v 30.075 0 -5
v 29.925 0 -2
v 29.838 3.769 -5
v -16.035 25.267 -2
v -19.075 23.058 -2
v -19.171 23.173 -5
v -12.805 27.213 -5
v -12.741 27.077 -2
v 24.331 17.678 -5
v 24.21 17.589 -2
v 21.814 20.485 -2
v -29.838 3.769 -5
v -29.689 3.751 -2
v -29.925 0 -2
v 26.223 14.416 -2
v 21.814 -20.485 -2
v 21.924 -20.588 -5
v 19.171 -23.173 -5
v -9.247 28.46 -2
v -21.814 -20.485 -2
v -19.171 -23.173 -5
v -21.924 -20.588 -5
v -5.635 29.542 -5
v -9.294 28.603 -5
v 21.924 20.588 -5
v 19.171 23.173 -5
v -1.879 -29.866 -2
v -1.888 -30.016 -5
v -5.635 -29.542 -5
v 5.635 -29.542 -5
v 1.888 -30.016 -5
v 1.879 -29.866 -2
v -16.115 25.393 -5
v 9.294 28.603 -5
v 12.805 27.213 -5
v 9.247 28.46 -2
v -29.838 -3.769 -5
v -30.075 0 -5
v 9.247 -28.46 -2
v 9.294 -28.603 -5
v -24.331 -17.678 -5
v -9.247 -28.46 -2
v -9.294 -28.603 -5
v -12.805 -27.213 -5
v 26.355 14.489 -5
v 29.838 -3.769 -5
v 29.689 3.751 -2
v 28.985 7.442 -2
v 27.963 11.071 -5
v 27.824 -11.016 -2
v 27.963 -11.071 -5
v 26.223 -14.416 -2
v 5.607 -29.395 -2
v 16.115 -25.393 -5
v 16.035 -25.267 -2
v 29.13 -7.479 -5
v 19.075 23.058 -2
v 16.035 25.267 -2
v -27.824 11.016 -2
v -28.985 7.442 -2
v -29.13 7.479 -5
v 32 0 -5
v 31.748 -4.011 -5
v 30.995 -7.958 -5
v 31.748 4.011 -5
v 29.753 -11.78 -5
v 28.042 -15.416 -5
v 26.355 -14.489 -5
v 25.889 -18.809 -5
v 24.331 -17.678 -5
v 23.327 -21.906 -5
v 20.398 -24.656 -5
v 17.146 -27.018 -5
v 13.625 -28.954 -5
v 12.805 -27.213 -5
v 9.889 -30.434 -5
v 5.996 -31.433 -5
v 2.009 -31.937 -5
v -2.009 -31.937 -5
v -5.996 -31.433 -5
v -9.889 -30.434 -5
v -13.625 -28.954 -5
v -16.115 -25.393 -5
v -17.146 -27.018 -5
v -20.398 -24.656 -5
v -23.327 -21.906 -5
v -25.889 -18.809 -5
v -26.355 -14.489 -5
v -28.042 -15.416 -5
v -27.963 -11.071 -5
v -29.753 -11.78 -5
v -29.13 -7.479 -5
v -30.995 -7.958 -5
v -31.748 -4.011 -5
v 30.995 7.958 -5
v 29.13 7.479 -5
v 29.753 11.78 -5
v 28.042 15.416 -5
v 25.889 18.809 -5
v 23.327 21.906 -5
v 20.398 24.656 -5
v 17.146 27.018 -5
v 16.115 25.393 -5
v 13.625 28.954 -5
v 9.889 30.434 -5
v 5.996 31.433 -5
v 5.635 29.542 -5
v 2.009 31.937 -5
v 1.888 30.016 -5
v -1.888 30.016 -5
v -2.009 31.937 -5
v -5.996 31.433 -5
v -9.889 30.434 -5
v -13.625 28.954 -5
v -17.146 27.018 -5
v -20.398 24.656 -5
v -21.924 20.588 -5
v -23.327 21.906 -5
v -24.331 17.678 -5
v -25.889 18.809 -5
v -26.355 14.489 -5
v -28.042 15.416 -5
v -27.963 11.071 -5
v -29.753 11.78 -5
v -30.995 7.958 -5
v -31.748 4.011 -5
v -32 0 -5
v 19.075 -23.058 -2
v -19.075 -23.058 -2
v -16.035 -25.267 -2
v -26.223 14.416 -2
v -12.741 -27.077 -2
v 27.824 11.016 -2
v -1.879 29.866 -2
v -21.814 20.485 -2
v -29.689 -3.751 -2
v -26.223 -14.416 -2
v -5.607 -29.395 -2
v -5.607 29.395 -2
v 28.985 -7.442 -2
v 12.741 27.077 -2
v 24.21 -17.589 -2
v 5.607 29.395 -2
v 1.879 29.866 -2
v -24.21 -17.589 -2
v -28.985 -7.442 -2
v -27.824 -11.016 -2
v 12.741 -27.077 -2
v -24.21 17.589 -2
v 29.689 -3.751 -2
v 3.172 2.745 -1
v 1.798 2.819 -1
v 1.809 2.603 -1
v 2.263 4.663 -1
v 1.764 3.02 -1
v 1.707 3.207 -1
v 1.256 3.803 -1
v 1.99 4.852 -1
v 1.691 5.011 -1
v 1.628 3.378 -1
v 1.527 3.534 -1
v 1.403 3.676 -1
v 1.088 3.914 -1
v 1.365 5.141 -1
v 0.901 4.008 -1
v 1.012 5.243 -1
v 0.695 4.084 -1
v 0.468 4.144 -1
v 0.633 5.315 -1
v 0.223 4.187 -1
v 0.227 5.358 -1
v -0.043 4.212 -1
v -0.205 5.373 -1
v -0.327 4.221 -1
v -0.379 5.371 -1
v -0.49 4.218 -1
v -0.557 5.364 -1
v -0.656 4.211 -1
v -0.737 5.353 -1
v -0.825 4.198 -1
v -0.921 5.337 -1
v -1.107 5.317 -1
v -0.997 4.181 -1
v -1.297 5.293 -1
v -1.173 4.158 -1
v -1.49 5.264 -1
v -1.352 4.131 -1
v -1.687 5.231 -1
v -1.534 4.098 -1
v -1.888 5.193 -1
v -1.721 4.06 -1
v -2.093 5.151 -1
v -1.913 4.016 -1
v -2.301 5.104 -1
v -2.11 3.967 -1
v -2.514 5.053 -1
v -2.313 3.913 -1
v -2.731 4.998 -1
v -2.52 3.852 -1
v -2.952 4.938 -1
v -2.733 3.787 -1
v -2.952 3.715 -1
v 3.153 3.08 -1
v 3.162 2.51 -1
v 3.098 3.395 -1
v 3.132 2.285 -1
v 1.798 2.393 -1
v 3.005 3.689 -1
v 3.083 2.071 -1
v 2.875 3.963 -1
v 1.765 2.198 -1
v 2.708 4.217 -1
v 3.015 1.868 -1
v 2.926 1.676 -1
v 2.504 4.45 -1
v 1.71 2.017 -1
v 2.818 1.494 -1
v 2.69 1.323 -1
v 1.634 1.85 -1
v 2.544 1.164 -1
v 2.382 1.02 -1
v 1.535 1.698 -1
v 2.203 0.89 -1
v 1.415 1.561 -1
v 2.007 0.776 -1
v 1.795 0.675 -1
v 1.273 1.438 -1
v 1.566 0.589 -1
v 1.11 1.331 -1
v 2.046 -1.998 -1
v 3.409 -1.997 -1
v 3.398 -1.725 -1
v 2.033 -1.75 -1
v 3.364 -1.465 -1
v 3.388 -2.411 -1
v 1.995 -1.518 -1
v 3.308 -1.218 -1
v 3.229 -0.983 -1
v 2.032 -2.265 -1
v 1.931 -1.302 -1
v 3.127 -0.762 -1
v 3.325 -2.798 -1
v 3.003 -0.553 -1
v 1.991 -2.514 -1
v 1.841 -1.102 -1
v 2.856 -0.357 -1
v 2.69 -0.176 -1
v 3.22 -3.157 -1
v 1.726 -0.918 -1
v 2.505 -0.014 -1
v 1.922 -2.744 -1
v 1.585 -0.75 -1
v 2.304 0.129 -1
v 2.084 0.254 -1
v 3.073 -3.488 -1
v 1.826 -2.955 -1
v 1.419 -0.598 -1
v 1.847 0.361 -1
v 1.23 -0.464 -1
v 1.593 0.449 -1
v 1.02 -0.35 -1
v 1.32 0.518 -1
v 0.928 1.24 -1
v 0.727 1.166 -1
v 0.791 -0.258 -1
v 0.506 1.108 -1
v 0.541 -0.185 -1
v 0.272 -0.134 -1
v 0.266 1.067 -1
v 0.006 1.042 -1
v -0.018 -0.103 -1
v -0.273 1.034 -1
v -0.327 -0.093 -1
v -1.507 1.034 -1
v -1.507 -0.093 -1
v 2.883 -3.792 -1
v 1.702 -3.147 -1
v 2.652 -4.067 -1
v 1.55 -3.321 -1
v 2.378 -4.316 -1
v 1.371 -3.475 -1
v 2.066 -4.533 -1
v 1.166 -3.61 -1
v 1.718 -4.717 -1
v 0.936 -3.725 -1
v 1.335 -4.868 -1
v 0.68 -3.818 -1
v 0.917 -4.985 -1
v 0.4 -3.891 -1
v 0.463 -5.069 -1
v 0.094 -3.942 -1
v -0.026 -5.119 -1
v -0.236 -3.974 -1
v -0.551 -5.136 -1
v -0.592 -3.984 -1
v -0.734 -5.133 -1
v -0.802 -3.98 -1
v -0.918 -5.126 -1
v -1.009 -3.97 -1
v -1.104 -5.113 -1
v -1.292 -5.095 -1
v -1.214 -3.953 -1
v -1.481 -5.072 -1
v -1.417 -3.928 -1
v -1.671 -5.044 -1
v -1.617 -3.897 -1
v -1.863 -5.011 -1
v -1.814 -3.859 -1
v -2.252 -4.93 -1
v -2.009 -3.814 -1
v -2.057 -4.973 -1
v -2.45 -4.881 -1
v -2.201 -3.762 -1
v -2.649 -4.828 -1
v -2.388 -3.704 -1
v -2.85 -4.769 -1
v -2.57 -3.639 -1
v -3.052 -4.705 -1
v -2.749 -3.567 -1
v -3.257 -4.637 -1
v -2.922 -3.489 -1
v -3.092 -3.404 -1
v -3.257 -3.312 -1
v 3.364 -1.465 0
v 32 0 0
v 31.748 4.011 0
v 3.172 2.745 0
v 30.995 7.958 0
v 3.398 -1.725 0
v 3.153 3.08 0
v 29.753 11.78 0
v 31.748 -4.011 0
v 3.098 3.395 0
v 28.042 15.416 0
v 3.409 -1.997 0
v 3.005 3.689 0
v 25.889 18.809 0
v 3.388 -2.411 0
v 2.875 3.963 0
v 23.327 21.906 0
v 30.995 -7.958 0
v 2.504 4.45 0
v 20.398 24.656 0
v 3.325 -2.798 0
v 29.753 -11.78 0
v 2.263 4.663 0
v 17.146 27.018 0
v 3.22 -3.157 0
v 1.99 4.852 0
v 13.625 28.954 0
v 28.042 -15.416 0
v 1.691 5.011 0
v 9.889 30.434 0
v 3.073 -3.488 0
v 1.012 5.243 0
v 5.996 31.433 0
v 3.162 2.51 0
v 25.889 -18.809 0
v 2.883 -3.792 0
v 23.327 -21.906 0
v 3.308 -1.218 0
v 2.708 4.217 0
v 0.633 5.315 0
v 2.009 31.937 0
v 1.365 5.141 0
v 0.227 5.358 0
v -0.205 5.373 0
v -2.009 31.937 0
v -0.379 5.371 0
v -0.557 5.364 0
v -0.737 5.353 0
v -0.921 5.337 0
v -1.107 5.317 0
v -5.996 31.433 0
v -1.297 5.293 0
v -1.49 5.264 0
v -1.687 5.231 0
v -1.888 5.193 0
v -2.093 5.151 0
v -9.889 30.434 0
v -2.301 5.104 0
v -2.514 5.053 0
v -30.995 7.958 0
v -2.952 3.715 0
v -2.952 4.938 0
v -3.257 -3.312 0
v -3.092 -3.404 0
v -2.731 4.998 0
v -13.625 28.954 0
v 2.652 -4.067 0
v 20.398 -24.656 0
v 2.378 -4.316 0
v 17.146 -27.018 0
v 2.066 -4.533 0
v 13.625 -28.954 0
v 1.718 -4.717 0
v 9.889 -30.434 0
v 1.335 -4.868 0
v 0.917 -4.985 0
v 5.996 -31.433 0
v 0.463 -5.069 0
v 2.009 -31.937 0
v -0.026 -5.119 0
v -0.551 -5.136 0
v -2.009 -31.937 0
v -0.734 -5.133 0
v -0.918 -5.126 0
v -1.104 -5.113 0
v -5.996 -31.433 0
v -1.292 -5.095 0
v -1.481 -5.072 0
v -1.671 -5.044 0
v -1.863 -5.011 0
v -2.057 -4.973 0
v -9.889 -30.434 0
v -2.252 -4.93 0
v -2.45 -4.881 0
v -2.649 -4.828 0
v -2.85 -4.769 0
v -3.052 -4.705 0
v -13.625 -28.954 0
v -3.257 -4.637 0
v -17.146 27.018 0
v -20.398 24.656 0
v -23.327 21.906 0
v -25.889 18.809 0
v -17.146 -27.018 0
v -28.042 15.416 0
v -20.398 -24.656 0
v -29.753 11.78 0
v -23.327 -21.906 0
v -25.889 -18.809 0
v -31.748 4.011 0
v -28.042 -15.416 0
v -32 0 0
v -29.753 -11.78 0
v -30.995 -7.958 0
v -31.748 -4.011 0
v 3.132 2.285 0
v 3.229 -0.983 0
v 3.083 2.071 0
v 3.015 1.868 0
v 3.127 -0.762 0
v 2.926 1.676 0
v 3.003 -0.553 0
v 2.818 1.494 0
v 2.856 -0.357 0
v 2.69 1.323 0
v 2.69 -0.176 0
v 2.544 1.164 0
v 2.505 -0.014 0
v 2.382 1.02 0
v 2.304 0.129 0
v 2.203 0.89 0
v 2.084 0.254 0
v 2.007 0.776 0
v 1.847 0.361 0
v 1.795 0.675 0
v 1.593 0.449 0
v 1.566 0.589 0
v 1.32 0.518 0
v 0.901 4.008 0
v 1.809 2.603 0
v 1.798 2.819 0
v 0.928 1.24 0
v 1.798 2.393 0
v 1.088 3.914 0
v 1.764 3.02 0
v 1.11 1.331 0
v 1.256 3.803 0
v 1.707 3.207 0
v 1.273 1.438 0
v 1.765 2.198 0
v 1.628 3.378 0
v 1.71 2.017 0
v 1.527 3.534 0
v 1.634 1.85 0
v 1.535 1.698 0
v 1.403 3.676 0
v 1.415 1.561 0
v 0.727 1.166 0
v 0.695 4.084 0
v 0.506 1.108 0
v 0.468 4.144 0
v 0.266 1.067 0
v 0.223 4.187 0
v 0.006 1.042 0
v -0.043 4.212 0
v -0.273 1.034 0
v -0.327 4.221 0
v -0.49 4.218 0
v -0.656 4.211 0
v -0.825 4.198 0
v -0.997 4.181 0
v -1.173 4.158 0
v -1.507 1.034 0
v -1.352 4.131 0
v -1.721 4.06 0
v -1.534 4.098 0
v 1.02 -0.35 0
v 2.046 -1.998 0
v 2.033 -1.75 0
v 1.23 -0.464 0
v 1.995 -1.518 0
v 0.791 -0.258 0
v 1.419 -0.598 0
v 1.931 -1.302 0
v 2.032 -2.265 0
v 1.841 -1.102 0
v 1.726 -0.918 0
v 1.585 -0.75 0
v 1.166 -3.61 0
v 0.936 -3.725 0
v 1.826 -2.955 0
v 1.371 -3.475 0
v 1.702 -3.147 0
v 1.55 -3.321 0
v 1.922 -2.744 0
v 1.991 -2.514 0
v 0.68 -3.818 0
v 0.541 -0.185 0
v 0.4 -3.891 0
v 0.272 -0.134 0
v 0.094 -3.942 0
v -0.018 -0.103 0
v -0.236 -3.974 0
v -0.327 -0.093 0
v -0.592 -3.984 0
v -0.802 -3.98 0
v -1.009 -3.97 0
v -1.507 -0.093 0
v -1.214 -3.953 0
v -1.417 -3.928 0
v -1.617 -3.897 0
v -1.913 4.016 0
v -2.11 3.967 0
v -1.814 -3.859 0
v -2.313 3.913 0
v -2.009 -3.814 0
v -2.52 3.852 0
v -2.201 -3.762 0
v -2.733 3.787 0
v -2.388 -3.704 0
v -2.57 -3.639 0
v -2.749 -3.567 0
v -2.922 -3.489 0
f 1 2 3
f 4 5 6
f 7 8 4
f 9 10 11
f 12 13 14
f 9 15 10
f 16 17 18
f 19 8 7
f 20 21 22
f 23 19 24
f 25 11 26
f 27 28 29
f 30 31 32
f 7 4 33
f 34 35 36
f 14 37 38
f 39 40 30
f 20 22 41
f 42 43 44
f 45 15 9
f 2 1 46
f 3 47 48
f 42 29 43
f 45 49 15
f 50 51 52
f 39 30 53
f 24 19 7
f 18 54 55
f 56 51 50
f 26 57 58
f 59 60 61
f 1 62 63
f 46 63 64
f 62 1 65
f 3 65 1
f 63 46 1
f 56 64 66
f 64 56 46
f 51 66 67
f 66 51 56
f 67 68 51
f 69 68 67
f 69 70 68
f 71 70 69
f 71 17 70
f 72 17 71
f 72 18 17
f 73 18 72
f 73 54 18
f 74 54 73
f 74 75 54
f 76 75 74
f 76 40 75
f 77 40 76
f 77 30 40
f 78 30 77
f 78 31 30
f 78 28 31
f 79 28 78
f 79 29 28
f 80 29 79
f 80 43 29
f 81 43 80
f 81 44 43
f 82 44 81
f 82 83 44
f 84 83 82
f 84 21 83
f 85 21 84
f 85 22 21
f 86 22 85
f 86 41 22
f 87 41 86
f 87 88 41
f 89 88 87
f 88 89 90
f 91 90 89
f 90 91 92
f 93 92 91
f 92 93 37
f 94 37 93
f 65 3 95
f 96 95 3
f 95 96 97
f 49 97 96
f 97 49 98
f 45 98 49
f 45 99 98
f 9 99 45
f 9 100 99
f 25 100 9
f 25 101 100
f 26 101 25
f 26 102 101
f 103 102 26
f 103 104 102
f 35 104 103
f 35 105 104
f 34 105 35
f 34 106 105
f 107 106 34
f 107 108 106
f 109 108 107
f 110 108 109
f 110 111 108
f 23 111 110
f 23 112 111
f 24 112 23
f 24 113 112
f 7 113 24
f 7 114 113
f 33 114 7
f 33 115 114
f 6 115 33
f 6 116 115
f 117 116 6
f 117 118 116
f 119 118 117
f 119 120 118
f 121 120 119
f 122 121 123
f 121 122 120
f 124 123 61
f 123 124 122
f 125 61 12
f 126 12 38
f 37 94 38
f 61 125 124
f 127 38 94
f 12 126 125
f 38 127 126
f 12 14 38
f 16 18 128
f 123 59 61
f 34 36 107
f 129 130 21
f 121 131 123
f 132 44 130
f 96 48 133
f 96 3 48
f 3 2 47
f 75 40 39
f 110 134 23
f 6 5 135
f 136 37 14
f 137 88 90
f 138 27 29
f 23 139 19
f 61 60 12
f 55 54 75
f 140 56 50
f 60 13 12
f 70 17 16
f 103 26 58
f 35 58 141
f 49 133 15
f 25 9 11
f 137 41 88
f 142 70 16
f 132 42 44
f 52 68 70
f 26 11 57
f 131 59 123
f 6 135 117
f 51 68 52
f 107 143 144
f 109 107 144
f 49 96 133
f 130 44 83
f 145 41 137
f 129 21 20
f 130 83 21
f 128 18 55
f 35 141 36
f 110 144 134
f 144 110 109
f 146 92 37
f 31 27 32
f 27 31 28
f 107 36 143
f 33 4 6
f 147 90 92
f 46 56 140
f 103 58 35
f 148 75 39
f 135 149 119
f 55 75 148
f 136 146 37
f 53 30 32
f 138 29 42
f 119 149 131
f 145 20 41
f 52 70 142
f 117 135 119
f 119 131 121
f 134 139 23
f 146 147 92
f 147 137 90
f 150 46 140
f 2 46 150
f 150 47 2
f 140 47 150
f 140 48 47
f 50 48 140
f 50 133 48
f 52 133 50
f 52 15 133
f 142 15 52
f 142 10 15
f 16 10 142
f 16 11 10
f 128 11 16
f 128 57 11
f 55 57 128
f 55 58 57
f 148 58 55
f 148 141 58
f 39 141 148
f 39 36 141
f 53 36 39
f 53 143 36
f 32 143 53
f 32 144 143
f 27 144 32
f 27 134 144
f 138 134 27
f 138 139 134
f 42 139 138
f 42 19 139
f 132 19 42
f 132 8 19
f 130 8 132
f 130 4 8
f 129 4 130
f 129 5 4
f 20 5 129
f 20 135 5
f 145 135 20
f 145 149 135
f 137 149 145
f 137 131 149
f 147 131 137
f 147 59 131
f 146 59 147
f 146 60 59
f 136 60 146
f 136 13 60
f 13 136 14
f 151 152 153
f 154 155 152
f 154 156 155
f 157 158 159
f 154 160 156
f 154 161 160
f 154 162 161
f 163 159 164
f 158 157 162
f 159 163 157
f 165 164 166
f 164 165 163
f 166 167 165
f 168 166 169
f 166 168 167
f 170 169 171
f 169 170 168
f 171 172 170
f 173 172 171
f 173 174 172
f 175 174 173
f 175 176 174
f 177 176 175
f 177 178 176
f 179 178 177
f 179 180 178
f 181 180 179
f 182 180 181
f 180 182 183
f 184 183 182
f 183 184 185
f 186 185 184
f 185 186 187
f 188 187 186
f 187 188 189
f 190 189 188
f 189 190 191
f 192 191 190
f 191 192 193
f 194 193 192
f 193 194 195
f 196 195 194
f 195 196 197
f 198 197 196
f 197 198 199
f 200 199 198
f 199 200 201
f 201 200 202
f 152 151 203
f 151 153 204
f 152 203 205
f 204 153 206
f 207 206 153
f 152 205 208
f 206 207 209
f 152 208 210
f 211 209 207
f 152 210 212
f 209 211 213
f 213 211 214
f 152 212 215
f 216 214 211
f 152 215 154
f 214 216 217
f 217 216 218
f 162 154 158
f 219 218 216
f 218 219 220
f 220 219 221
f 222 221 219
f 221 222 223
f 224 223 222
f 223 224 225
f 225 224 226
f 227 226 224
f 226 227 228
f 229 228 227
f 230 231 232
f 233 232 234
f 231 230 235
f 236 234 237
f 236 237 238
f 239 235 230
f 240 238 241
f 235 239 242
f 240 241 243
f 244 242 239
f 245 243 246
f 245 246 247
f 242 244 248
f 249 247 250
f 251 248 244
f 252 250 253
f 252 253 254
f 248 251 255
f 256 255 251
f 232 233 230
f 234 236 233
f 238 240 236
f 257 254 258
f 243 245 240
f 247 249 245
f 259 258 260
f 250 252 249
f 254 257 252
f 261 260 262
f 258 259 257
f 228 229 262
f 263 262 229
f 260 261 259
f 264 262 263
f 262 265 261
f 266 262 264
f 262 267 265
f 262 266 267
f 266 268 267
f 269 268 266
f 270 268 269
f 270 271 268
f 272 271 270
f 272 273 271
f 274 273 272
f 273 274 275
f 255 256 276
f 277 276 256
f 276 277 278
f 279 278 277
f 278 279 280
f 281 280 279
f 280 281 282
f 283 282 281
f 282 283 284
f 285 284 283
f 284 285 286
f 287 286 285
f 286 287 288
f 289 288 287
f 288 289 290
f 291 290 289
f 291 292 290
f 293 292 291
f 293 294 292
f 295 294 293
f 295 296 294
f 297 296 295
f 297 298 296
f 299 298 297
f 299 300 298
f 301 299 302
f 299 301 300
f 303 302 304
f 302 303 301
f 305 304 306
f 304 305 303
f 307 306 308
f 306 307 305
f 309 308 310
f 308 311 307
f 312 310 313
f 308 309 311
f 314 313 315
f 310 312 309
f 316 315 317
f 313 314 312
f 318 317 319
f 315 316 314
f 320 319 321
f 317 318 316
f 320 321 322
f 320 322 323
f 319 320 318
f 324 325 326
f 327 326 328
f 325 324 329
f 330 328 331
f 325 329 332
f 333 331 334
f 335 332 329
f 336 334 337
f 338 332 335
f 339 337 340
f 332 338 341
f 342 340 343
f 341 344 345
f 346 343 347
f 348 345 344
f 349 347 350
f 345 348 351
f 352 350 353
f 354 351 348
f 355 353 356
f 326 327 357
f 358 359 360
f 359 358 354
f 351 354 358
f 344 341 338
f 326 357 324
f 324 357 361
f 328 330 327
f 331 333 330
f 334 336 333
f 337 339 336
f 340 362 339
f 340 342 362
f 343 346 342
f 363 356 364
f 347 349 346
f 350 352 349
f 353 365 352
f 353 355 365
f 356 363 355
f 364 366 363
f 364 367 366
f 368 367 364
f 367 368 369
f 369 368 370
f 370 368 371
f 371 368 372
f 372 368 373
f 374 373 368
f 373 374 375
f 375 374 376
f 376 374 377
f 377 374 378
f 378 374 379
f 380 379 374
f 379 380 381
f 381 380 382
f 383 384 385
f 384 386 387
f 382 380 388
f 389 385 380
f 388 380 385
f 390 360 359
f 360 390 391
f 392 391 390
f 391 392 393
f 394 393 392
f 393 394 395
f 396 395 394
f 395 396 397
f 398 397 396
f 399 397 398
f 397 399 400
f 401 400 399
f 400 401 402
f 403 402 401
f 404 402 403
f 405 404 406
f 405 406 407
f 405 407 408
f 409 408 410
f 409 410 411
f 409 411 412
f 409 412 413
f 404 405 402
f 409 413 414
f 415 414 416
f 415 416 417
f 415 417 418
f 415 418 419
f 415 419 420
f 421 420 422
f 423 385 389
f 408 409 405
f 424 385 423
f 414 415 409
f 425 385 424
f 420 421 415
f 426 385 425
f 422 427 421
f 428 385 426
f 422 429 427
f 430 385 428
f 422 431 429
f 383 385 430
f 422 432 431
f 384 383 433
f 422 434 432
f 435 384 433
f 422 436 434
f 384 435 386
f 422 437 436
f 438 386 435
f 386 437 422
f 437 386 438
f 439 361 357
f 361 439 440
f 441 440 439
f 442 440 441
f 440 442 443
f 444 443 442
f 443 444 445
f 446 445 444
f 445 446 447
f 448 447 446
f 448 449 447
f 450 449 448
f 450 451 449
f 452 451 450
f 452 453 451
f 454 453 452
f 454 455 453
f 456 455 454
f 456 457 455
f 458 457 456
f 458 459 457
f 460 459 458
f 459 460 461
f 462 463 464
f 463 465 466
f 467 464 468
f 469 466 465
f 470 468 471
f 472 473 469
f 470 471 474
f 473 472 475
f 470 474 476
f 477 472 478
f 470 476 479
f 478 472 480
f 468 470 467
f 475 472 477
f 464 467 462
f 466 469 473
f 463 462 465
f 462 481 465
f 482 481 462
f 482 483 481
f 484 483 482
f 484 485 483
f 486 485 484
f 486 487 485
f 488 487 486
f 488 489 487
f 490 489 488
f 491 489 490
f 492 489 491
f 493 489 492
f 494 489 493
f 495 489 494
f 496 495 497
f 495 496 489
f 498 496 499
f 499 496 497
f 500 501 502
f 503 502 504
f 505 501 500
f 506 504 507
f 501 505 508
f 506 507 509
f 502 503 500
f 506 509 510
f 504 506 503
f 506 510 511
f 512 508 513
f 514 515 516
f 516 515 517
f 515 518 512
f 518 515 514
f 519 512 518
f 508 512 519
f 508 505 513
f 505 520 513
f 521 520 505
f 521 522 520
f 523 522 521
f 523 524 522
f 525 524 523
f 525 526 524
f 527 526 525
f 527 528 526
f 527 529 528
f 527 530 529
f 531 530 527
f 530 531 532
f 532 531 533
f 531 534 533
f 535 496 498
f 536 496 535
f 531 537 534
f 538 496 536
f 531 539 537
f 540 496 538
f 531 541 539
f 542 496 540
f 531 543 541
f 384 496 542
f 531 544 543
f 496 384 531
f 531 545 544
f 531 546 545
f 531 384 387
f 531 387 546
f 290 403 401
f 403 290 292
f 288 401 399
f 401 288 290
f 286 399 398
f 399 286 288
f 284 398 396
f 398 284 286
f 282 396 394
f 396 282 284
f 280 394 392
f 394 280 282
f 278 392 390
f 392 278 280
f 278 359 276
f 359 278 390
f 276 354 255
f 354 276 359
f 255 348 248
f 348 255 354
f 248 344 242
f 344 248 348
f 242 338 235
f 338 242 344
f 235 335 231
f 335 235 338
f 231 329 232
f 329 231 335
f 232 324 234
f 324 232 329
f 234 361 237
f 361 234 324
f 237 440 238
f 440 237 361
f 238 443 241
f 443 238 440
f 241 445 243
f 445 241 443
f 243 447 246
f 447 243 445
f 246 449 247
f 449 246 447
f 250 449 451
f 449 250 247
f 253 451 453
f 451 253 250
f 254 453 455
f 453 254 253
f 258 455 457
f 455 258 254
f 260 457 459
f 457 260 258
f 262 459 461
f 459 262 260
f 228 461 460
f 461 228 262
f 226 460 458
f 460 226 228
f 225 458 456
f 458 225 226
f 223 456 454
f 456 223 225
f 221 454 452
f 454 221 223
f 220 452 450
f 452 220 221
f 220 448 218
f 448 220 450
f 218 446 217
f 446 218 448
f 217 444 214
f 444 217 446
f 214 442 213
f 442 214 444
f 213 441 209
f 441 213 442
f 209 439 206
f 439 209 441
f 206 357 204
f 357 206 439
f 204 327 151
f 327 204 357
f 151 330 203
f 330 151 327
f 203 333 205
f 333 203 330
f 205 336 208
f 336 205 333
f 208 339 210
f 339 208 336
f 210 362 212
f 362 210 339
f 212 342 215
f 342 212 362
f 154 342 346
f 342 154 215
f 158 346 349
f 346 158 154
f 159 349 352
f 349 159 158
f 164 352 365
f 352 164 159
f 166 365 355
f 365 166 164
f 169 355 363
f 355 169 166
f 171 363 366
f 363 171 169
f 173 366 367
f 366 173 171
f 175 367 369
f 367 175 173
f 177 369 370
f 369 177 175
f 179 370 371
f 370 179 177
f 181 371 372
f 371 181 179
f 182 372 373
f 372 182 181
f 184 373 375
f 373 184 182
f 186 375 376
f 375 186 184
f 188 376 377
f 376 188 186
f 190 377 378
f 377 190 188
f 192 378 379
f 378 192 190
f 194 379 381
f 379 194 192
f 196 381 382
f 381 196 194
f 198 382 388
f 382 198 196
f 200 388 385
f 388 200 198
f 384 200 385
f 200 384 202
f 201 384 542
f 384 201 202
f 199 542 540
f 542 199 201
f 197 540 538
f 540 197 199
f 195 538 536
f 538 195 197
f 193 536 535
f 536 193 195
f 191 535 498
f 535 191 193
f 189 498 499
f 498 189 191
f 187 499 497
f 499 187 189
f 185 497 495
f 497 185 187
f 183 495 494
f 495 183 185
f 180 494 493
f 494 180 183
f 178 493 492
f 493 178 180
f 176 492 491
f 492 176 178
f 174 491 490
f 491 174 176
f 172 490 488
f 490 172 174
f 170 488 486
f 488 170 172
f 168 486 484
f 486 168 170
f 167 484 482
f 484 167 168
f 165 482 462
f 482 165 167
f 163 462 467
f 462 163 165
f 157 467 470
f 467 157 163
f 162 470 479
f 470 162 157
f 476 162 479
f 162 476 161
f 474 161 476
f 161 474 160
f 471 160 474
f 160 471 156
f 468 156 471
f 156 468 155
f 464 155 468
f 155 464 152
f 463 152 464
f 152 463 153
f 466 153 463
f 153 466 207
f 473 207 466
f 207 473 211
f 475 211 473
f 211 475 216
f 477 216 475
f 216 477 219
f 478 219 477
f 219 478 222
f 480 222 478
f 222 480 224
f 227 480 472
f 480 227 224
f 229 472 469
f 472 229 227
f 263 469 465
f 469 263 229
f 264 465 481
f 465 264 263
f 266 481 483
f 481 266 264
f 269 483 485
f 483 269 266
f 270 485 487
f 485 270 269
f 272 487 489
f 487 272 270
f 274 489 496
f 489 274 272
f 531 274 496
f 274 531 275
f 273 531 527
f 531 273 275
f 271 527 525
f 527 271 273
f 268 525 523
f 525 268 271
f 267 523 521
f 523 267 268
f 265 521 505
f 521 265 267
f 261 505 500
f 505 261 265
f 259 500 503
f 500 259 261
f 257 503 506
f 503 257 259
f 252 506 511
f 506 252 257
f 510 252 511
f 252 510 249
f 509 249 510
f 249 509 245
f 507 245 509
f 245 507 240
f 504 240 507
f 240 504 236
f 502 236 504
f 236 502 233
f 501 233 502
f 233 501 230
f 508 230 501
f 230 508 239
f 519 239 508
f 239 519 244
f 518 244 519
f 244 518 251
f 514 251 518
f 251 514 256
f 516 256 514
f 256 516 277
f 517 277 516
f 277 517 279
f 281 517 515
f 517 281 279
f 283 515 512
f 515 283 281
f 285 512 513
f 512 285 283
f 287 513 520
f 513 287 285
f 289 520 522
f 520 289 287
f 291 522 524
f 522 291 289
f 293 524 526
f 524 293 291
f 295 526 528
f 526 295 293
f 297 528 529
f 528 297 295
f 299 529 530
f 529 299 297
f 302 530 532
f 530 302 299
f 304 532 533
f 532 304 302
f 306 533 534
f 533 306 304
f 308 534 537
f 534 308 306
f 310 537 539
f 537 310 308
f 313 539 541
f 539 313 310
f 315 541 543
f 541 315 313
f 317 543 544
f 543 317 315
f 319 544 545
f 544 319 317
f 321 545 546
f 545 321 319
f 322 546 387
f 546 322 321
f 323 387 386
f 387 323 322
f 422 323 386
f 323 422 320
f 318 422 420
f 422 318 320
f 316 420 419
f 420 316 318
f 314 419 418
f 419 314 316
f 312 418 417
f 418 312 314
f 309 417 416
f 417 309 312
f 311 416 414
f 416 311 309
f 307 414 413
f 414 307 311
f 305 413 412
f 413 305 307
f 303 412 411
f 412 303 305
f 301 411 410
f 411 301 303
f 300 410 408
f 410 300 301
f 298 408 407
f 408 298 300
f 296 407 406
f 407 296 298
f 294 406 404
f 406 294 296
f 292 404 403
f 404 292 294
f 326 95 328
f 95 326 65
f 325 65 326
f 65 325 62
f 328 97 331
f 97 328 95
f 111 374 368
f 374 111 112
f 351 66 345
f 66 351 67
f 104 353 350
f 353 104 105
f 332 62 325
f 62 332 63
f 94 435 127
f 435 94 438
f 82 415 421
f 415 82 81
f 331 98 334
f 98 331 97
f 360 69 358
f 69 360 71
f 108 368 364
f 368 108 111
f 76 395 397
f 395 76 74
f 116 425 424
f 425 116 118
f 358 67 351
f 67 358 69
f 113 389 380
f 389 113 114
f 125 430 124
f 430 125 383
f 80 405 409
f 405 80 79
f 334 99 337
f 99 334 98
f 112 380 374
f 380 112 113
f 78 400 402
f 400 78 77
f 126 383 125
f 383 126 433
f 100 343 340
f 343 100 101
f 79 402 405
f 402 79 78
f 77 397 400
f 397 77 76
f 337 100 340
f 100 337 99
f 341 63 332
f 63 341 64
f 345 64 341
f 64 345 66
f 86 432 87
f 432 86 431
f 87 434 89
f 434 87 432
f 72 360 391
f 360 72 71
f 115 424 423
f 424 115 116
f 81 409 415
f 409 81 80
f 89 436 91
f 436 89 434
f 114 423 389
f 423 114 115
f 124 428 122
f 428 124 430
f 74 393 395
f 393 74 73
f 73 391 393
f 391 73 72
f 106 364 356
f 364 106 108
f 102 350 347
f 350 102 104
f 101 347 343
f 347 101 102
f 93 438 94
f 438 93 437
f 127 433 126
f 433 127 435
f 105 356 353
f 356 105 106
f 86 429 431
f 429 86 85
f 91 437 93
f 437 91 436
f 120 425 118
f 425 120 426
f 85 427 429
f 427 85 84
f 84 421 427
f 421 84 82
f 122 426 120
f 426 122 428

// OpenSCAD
$fn = 50;

difference() {
	union() {
		translate(v = [0, 0, -5.0]) {
			cylinder(h = 5, r = 32.0);
		}
	}
	union() {
		#translate(v = [0, 0, -5.0]) {
			cylinder(h = 3, r1 = 30.075, r2 = 29.925);
		}
		translate(v = [0, 0, -1]) {
			linear_extrude(height = 1) {
				text(font = "Impact", halign = "center", size = 10, text = "3", valign = "center");
			}
		}
	}
}
